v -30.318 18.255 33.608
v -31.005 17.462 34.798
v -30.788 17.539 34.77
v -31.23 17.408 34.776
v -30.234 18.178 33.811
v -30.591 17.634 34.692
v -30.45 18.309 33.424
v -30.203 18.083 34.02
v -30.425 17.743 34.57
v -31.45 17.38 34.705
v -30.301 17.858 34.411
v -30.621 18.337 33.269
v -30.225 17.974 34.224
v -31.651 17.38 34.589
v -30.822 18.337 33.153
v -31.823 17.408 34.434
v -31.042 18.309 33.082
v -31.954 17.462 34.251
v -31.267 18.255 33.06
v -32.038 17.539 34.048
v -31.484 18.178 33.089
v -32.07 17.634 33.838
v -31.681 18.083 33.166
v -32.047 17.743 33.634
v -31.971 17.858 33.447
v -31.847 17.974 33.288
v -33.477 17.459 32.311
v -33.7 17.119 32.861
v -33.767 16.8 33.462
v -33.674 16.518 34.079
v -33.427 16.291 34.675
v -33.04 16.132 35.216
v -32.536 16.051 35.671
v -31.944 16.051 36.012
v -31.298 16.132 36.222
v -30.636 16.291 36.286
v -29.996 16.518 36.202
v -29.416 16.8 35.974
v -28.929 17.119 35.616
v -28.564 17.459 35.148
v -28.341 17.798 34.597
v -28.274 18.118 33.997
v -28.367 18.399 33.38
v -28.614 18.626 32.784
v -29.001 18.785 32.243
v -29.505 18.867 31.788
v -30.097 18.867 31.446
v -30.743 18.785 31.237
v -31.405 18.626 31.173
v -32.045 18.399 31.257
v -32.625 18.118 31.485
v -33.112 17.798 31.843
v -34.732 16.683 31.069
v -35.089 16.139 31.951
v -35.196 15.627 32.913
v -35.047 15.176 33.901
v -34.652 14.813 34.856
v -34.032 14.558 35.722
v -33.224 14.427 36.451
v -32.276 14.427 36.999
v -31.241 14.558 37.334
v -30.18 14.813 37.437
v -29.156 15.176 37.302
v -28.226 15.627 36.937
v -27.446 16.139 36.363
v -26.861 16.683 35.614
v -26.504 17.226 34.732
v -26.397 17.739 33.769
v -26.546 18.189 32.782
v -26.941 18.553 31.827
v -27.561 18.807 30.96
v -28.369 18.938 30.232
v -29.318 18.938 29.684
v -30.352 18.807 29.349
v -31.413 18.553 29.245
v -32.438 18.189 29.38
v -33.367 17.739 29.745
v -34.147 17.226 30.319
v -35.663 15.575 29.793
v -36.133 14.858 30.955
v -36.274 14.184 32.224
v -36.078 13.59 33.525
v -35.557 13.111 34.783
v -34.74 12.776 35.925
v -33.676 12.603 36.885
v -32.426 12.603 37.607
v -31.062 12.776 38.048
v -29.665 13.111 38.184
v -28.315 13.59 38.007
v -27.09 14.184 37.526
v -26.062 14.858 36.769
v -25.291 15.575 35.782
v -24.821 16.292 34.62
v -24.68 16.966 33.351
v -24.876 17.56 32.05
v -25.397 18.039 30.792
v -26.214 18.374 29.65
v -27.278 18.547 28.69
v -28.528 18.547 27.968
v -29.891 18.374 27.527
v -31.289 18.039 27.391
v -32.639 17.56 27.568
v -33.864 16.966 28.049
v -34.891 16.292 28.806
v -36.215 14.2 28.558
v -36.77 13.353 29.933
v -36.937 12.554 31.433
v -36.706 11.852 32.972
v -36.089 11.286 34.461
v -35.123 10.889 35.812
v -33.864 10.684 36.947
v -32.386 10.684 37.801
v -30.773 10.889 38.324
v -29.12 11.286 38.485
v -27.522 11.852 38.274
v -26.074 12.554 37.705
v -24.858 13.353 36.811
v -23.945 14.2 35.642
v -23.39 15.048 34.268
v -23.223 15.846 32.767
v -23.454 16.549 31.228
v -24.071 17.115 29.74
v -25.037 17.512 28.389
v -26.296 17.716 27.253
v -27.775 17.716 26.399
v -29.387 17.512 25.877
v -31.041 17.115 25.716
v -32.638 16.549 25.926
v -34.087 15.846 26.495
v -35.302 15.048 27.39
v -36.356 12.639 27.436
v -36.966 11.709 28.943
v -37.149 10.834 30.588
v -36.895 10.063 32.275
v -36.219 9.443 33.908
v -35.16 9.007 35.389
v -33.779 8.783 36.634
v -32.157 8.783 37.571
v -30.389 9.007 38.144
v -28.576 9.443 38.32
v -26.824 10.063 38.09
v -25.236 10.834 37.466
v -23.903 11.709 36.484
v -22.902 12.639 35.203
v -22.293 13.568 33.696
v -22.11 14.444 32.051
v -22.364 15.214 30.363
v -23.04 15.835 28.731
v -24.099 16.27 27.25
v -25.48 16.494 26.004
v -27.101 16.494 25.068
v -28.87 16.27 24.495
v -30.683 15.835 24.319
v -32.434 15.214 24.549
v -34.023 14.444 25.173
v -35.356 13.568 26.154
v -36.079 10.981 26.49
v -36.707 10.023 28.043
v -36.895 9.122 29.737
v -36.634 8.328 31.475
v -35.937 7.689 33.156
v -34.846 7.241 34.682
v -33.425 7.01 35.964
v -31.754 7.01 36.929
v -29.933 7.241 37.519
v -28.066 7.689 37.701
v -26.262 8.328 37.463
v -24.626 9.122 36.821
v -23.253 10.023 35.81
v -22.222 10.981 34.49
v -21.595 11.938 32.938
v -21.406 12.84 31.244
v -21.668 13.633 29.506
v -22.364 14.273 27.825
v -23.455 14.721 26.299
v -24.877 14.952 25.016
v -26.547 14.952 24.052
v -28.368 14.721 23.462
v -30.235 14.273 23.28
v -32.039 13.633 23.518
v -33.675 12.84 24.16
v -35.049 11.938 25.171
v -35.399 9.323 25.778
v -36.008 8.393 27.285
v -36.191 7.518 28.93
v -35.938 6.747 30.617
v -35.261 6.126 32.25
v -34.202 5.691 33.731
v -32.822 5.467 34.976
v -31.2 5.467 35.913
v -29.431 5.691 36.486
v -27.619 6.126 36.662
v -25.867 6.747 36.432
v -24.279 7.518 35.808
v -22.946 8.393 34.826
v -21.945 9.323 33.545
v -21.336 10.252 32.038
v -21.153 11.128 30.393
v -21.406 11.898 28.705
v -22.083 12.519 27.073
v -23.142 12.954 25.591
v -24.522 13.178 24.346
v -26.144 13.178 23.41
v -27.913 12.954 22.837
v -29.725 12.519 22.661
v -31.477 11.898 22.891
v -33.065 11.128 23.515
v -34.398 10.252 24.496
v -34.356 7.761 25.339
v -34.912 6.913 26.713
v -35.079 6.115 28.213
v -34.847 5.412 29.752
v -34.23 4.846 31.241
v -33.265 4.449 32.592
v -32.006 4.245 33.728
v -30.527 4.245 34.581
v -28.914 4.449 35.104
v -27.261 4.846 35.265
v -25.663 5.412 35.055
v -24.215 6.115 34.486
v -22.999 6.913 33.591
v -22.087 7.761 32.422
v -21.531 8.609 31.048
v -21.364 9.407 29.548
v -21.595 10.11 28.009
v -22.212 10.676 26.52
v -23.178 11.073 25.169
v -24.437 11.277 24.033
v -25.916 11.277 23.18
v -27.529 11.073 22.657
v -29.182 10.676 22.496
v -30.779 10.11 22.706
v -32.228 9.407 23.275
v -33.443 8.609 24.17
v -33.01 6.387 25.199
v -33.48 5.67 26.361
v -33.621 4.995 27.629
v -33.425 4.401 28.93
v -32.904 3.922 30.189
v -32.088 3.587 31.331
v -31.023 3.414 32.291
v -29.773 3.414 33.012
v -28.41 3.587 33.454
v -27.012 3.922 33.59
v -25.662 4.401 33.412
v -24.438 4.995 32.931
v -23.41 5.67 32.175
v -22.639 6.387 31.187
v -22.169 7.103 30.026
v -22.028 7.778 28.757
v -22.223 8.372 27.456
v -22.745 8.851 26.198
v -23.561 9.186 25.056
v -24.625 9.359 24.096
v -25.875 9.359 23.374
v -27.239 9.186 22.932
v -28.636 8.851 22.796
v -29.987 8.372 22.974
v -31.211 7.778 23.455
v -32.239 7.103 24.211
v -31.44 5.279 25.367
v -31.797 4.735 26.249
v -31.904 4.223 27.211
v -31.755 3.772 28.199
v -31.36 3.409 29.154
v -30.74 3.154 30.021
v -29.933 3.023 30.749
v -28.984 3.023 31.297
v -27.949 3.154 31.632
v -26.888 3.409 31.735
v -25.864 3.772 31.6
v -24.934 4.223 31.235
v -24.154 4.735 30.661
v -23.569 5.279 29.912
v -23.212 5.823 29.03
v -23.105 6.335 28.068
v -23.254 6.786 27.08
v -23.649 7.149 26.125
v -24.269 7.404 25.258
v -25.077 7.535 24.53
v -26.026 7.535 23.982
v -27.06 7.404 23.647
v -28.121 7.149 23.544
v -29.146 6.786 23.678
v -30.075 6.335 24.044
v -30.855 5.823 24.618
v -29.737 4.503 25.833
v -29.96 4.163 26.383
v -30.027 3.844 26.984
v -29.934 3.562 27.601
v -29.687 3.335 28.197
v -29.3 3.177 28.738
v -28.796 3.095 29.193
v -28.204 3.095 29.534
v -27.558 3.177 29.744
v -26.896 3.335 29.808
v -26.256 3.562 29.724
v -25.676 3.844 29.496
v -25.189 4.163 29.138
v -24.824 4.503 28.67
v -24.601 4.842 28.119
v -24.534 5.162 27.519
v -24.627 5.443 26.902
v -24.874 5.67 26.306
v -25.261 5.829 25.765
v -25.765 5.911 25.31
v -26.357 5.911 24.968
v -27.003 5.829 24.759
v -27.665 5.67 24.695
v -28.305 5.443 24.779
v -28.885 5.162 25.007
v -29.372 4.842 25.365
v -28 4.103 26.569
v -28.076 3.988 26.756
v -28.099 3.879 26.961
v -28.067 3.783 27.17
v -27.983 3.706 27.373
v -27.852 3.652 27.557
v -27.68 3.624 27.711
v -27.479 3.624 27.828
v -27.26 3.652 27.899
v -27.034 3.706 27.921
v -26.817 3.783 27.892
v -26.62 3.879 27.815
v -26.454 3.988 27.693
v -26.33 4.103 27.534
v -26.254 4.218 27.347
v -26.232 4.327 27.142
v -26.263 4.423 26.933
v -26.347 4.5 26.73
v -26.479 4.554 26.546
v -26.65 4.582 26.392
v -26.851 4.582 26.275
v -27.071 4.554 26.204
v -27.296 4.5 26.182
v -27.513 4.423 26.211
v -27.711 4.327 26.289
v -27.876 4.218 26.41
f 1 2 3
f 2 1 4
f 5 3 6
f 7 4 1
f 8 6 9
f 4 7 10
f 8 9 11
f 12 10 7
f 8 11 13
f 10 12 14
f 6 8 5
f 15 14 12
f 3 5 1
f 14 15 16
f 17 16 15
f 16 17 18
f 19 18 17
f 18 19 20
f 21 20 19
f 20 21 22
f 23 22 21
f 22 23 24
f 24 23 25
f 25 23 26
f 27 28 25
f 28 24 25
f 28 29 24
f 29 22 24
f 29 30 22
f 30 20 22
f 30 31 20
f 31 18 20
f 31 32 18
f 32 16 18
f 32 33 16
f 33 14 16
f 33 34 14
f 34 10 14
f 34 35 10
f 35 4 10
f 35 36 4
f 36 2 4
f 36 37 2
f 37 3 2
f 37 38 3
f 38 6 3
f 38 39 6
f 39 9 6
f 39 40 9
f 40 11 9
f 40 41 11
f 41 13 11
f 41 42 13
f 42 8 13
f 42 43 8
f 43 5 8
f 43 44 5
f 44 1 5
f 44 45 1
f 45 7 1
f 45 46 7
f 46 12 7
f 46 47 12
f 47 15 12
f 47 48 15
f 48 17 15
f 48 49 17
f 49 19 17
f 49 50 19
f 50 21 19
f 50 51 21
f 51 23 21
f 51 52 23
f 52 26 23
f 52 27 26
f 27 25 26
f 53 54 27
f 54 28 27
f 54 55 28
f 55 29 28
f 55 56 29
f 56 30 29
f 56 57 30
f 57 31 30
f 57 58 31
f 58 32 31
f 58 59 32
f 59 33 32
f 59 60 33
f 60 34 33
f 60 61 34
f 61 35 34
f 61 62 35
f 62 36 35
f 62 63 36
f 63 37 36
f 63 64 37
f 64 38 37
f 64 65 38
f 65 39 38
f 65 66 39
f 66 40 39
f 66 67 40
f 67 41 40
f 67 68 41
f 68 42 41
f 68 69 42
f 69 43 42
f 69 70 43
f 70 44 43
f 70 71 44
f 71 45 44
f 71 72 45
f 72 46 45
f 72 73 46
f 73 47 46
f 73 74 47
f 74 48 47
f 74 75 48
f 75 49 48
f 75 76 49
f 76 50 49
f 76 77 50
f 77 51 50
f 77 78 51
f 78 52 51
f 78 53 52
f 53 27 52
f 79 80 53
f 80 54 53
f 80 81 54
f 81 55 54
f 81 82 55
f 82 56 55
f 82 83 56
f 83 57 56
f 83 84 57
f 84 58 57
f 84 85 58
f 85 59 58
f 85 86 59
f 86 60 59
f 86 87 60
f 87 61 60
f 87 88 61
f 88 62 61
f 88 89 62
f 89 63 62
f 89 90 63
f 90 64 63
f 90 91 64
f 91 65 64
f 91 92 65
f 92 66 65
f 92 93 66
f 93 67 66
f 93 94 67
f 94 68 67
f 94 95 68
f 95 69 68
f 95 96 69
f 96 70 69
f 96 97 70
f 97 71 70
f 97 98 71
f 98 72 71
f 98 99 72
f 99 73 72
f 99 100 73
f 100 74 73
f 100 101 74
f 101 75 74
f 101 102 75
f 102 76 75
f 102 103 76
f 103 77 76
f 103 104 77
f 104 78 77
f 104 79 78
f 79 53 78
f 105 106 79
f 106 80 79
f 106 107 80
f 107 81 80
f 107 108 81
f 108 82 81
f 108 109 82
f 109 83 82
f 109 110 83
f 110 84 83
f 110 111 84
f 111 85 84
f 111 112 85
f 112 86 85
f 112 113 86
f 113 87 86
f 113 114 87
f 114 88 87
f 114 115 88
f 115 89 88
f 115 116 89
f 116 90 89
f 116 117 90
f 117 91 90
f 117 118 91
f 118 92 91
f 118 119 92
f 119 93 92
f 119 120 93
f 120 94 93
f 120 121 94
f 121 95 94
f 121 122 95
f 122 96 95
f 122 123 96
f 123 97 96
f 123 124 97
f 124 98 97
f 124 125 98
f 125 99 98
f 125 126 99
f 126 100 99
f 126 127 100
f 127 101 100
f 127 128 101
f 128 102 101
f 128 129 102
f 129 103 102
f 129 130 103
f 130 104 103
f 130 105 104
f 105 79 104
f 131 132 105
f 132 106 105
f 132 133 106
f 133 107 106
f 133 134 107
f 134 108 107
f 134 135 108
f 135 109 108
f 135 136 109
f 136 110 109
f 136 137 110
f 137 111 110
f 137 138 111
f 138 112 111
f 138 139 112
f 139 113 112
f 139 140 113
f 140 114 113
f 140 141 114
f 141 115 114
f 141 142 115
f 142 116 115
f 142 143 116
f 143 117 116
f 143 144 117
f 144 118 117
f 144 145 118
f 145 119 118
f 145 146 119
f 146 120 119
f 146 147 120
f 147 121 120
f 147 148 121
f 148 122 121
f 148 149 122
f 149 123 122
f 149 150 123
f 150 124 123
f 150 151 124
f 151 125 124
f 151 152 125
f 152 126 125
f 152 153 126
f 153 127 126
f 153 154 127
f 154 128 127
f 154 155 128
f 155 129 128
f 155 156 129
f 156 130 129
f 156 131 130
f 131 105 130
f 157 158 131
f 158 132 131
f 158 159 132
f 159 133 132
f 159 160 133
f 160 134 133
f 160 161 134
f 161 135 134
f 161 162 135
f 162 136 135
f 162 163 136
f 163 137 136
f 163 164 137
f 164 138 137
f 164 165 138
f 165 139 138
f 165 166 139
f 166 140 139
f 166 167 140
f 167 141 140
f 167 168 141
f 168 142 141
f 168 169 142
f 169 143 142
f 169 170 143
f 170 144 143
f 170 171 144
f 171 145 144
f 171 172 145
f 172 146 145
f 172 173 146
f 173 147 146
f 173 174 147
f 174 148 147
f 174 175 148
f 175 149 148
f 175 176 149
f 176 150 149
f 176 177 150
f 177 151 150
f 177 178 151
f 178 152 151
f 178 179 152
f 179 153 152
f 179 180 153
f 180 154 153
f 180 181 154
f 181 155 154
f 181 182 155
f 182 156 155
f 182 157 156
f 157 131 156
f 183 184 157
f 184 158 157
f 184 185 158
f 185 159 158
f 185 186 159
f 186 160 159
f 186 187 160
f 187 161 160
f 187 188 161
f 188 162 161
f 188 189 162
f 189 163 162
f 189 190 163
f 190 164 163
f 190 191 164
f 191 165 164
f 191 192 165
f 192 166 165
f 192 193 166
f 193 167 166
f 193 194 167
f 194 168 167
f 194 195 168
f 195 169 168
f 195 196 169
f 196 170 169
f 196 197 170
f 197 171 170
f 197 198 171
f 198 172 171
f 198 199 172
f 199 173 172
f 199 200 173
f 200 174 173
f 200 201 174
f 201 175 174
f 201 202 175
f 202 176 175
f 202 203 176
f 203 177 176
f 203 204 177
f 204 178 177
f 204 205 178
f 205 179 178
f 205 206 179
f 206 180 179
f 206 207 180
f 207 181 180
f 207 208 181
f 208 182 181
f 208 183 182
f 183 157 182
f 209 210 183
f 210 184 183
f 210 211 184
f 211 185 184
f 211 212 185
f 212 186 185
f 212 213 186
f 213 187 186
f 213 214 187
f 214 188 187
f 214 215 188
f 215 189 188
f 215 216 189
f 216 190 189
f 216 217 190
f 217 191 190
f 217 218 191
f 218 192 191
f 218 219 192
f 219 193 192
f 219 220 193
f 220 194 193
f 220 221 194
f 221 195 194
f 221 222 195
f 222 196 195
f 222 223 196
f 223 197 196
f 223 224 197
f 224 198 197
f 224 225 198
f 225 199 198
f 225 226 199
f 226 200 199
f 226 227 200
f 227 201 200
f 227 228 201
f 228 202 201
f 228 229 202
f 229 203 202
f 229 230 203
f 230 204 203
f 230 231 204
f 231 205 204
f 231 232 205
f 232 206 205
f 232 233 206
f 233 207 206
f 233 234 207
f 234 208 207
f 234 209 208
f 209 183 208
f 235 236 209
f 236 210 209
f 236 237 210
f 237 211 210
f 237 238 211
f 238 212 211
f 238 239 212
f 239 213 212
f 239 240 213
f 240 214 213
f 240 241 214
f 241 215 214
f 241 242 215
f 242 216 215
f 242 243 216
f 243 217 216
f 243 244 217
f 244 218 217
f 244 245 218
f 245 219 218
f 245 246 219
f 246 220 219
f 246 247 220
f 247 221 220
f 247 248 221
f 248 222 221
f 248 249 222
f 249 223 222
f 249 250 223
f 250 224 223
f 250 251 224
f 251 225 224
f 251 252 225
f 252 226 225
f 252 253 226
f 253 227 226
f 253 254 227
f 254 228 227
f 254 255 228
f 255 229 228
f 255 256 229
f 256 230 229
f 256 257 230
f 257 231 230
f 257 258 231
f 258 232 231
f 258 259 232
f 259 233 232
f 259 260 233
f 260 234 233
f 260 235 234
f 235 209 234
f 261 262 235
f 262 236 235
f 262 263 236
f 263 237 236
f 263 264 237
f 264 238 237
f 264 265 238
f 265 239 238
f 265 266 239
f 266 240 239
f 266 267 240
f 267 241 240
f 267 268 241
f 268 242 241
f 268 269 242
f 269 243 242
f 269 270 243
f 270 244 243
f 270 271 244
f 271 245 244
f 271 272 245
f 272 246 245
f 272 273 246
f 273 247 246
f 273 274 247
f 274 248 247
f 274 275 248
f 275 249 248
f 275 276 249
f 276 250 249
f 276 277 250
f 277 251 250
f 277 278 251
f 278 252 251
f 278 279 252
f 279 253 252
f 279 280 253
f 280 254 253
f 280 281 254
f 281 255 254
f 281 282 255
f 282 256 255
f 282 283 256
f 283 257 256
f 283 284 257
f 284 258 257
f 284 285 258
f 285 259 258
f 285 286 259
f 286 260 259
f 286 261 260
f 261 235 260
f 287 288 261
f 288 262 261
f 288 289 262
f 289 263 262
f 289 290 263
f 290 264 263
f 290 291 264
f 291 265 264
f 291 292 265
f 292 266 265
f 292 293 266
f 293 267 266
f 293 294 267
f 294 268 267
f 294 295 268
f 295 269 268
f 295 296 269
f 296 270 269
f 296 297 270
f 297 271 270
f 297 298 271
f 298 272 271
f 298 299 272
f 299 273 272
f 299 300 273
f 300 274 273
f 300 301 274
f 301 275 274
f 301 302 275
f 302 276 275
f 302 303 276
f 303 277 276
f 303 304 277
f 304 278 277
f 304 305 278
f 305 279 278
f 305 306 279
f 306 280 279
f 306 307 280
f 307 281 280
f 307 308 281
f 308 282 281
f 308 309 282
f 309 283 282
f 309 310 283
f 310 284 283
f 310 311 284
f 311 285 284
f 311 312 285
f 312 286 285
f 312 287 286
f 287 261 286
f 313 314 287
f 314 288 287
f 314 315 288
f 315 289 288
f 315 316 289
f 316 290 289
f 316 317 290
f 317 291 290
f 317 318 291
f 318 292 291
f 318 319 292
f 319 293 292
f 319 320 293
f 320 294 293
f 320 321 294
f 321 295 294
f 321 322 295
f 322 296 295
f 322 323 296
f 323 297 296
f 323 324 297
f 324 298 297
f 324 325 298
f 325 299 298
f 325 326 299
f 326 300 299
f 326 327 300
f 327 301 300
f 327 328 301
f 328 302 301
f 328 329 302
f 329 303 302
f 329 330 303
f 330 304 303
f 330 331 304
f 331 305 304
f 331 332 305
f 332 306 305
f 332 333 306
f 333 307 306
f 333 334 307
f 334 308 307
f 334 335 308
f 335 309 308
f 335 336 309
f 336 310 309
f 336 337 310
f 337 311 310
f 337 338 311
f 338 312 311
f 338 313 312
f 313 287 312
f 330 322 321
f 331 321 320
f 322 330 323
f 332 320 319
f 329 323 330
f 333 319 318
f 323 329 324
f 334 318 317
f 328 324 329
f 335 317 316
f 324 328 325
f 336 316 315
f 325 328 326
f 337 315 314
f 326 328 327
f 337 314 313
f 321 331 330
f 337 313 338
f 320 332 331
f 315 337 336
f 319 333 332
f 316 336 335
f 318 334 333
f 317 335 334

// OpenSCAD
// Generated by generate_scads.py
rotate([60,30,180]) {
  translate([10,30,30]) {
    sphere(r=8);
  }
}
